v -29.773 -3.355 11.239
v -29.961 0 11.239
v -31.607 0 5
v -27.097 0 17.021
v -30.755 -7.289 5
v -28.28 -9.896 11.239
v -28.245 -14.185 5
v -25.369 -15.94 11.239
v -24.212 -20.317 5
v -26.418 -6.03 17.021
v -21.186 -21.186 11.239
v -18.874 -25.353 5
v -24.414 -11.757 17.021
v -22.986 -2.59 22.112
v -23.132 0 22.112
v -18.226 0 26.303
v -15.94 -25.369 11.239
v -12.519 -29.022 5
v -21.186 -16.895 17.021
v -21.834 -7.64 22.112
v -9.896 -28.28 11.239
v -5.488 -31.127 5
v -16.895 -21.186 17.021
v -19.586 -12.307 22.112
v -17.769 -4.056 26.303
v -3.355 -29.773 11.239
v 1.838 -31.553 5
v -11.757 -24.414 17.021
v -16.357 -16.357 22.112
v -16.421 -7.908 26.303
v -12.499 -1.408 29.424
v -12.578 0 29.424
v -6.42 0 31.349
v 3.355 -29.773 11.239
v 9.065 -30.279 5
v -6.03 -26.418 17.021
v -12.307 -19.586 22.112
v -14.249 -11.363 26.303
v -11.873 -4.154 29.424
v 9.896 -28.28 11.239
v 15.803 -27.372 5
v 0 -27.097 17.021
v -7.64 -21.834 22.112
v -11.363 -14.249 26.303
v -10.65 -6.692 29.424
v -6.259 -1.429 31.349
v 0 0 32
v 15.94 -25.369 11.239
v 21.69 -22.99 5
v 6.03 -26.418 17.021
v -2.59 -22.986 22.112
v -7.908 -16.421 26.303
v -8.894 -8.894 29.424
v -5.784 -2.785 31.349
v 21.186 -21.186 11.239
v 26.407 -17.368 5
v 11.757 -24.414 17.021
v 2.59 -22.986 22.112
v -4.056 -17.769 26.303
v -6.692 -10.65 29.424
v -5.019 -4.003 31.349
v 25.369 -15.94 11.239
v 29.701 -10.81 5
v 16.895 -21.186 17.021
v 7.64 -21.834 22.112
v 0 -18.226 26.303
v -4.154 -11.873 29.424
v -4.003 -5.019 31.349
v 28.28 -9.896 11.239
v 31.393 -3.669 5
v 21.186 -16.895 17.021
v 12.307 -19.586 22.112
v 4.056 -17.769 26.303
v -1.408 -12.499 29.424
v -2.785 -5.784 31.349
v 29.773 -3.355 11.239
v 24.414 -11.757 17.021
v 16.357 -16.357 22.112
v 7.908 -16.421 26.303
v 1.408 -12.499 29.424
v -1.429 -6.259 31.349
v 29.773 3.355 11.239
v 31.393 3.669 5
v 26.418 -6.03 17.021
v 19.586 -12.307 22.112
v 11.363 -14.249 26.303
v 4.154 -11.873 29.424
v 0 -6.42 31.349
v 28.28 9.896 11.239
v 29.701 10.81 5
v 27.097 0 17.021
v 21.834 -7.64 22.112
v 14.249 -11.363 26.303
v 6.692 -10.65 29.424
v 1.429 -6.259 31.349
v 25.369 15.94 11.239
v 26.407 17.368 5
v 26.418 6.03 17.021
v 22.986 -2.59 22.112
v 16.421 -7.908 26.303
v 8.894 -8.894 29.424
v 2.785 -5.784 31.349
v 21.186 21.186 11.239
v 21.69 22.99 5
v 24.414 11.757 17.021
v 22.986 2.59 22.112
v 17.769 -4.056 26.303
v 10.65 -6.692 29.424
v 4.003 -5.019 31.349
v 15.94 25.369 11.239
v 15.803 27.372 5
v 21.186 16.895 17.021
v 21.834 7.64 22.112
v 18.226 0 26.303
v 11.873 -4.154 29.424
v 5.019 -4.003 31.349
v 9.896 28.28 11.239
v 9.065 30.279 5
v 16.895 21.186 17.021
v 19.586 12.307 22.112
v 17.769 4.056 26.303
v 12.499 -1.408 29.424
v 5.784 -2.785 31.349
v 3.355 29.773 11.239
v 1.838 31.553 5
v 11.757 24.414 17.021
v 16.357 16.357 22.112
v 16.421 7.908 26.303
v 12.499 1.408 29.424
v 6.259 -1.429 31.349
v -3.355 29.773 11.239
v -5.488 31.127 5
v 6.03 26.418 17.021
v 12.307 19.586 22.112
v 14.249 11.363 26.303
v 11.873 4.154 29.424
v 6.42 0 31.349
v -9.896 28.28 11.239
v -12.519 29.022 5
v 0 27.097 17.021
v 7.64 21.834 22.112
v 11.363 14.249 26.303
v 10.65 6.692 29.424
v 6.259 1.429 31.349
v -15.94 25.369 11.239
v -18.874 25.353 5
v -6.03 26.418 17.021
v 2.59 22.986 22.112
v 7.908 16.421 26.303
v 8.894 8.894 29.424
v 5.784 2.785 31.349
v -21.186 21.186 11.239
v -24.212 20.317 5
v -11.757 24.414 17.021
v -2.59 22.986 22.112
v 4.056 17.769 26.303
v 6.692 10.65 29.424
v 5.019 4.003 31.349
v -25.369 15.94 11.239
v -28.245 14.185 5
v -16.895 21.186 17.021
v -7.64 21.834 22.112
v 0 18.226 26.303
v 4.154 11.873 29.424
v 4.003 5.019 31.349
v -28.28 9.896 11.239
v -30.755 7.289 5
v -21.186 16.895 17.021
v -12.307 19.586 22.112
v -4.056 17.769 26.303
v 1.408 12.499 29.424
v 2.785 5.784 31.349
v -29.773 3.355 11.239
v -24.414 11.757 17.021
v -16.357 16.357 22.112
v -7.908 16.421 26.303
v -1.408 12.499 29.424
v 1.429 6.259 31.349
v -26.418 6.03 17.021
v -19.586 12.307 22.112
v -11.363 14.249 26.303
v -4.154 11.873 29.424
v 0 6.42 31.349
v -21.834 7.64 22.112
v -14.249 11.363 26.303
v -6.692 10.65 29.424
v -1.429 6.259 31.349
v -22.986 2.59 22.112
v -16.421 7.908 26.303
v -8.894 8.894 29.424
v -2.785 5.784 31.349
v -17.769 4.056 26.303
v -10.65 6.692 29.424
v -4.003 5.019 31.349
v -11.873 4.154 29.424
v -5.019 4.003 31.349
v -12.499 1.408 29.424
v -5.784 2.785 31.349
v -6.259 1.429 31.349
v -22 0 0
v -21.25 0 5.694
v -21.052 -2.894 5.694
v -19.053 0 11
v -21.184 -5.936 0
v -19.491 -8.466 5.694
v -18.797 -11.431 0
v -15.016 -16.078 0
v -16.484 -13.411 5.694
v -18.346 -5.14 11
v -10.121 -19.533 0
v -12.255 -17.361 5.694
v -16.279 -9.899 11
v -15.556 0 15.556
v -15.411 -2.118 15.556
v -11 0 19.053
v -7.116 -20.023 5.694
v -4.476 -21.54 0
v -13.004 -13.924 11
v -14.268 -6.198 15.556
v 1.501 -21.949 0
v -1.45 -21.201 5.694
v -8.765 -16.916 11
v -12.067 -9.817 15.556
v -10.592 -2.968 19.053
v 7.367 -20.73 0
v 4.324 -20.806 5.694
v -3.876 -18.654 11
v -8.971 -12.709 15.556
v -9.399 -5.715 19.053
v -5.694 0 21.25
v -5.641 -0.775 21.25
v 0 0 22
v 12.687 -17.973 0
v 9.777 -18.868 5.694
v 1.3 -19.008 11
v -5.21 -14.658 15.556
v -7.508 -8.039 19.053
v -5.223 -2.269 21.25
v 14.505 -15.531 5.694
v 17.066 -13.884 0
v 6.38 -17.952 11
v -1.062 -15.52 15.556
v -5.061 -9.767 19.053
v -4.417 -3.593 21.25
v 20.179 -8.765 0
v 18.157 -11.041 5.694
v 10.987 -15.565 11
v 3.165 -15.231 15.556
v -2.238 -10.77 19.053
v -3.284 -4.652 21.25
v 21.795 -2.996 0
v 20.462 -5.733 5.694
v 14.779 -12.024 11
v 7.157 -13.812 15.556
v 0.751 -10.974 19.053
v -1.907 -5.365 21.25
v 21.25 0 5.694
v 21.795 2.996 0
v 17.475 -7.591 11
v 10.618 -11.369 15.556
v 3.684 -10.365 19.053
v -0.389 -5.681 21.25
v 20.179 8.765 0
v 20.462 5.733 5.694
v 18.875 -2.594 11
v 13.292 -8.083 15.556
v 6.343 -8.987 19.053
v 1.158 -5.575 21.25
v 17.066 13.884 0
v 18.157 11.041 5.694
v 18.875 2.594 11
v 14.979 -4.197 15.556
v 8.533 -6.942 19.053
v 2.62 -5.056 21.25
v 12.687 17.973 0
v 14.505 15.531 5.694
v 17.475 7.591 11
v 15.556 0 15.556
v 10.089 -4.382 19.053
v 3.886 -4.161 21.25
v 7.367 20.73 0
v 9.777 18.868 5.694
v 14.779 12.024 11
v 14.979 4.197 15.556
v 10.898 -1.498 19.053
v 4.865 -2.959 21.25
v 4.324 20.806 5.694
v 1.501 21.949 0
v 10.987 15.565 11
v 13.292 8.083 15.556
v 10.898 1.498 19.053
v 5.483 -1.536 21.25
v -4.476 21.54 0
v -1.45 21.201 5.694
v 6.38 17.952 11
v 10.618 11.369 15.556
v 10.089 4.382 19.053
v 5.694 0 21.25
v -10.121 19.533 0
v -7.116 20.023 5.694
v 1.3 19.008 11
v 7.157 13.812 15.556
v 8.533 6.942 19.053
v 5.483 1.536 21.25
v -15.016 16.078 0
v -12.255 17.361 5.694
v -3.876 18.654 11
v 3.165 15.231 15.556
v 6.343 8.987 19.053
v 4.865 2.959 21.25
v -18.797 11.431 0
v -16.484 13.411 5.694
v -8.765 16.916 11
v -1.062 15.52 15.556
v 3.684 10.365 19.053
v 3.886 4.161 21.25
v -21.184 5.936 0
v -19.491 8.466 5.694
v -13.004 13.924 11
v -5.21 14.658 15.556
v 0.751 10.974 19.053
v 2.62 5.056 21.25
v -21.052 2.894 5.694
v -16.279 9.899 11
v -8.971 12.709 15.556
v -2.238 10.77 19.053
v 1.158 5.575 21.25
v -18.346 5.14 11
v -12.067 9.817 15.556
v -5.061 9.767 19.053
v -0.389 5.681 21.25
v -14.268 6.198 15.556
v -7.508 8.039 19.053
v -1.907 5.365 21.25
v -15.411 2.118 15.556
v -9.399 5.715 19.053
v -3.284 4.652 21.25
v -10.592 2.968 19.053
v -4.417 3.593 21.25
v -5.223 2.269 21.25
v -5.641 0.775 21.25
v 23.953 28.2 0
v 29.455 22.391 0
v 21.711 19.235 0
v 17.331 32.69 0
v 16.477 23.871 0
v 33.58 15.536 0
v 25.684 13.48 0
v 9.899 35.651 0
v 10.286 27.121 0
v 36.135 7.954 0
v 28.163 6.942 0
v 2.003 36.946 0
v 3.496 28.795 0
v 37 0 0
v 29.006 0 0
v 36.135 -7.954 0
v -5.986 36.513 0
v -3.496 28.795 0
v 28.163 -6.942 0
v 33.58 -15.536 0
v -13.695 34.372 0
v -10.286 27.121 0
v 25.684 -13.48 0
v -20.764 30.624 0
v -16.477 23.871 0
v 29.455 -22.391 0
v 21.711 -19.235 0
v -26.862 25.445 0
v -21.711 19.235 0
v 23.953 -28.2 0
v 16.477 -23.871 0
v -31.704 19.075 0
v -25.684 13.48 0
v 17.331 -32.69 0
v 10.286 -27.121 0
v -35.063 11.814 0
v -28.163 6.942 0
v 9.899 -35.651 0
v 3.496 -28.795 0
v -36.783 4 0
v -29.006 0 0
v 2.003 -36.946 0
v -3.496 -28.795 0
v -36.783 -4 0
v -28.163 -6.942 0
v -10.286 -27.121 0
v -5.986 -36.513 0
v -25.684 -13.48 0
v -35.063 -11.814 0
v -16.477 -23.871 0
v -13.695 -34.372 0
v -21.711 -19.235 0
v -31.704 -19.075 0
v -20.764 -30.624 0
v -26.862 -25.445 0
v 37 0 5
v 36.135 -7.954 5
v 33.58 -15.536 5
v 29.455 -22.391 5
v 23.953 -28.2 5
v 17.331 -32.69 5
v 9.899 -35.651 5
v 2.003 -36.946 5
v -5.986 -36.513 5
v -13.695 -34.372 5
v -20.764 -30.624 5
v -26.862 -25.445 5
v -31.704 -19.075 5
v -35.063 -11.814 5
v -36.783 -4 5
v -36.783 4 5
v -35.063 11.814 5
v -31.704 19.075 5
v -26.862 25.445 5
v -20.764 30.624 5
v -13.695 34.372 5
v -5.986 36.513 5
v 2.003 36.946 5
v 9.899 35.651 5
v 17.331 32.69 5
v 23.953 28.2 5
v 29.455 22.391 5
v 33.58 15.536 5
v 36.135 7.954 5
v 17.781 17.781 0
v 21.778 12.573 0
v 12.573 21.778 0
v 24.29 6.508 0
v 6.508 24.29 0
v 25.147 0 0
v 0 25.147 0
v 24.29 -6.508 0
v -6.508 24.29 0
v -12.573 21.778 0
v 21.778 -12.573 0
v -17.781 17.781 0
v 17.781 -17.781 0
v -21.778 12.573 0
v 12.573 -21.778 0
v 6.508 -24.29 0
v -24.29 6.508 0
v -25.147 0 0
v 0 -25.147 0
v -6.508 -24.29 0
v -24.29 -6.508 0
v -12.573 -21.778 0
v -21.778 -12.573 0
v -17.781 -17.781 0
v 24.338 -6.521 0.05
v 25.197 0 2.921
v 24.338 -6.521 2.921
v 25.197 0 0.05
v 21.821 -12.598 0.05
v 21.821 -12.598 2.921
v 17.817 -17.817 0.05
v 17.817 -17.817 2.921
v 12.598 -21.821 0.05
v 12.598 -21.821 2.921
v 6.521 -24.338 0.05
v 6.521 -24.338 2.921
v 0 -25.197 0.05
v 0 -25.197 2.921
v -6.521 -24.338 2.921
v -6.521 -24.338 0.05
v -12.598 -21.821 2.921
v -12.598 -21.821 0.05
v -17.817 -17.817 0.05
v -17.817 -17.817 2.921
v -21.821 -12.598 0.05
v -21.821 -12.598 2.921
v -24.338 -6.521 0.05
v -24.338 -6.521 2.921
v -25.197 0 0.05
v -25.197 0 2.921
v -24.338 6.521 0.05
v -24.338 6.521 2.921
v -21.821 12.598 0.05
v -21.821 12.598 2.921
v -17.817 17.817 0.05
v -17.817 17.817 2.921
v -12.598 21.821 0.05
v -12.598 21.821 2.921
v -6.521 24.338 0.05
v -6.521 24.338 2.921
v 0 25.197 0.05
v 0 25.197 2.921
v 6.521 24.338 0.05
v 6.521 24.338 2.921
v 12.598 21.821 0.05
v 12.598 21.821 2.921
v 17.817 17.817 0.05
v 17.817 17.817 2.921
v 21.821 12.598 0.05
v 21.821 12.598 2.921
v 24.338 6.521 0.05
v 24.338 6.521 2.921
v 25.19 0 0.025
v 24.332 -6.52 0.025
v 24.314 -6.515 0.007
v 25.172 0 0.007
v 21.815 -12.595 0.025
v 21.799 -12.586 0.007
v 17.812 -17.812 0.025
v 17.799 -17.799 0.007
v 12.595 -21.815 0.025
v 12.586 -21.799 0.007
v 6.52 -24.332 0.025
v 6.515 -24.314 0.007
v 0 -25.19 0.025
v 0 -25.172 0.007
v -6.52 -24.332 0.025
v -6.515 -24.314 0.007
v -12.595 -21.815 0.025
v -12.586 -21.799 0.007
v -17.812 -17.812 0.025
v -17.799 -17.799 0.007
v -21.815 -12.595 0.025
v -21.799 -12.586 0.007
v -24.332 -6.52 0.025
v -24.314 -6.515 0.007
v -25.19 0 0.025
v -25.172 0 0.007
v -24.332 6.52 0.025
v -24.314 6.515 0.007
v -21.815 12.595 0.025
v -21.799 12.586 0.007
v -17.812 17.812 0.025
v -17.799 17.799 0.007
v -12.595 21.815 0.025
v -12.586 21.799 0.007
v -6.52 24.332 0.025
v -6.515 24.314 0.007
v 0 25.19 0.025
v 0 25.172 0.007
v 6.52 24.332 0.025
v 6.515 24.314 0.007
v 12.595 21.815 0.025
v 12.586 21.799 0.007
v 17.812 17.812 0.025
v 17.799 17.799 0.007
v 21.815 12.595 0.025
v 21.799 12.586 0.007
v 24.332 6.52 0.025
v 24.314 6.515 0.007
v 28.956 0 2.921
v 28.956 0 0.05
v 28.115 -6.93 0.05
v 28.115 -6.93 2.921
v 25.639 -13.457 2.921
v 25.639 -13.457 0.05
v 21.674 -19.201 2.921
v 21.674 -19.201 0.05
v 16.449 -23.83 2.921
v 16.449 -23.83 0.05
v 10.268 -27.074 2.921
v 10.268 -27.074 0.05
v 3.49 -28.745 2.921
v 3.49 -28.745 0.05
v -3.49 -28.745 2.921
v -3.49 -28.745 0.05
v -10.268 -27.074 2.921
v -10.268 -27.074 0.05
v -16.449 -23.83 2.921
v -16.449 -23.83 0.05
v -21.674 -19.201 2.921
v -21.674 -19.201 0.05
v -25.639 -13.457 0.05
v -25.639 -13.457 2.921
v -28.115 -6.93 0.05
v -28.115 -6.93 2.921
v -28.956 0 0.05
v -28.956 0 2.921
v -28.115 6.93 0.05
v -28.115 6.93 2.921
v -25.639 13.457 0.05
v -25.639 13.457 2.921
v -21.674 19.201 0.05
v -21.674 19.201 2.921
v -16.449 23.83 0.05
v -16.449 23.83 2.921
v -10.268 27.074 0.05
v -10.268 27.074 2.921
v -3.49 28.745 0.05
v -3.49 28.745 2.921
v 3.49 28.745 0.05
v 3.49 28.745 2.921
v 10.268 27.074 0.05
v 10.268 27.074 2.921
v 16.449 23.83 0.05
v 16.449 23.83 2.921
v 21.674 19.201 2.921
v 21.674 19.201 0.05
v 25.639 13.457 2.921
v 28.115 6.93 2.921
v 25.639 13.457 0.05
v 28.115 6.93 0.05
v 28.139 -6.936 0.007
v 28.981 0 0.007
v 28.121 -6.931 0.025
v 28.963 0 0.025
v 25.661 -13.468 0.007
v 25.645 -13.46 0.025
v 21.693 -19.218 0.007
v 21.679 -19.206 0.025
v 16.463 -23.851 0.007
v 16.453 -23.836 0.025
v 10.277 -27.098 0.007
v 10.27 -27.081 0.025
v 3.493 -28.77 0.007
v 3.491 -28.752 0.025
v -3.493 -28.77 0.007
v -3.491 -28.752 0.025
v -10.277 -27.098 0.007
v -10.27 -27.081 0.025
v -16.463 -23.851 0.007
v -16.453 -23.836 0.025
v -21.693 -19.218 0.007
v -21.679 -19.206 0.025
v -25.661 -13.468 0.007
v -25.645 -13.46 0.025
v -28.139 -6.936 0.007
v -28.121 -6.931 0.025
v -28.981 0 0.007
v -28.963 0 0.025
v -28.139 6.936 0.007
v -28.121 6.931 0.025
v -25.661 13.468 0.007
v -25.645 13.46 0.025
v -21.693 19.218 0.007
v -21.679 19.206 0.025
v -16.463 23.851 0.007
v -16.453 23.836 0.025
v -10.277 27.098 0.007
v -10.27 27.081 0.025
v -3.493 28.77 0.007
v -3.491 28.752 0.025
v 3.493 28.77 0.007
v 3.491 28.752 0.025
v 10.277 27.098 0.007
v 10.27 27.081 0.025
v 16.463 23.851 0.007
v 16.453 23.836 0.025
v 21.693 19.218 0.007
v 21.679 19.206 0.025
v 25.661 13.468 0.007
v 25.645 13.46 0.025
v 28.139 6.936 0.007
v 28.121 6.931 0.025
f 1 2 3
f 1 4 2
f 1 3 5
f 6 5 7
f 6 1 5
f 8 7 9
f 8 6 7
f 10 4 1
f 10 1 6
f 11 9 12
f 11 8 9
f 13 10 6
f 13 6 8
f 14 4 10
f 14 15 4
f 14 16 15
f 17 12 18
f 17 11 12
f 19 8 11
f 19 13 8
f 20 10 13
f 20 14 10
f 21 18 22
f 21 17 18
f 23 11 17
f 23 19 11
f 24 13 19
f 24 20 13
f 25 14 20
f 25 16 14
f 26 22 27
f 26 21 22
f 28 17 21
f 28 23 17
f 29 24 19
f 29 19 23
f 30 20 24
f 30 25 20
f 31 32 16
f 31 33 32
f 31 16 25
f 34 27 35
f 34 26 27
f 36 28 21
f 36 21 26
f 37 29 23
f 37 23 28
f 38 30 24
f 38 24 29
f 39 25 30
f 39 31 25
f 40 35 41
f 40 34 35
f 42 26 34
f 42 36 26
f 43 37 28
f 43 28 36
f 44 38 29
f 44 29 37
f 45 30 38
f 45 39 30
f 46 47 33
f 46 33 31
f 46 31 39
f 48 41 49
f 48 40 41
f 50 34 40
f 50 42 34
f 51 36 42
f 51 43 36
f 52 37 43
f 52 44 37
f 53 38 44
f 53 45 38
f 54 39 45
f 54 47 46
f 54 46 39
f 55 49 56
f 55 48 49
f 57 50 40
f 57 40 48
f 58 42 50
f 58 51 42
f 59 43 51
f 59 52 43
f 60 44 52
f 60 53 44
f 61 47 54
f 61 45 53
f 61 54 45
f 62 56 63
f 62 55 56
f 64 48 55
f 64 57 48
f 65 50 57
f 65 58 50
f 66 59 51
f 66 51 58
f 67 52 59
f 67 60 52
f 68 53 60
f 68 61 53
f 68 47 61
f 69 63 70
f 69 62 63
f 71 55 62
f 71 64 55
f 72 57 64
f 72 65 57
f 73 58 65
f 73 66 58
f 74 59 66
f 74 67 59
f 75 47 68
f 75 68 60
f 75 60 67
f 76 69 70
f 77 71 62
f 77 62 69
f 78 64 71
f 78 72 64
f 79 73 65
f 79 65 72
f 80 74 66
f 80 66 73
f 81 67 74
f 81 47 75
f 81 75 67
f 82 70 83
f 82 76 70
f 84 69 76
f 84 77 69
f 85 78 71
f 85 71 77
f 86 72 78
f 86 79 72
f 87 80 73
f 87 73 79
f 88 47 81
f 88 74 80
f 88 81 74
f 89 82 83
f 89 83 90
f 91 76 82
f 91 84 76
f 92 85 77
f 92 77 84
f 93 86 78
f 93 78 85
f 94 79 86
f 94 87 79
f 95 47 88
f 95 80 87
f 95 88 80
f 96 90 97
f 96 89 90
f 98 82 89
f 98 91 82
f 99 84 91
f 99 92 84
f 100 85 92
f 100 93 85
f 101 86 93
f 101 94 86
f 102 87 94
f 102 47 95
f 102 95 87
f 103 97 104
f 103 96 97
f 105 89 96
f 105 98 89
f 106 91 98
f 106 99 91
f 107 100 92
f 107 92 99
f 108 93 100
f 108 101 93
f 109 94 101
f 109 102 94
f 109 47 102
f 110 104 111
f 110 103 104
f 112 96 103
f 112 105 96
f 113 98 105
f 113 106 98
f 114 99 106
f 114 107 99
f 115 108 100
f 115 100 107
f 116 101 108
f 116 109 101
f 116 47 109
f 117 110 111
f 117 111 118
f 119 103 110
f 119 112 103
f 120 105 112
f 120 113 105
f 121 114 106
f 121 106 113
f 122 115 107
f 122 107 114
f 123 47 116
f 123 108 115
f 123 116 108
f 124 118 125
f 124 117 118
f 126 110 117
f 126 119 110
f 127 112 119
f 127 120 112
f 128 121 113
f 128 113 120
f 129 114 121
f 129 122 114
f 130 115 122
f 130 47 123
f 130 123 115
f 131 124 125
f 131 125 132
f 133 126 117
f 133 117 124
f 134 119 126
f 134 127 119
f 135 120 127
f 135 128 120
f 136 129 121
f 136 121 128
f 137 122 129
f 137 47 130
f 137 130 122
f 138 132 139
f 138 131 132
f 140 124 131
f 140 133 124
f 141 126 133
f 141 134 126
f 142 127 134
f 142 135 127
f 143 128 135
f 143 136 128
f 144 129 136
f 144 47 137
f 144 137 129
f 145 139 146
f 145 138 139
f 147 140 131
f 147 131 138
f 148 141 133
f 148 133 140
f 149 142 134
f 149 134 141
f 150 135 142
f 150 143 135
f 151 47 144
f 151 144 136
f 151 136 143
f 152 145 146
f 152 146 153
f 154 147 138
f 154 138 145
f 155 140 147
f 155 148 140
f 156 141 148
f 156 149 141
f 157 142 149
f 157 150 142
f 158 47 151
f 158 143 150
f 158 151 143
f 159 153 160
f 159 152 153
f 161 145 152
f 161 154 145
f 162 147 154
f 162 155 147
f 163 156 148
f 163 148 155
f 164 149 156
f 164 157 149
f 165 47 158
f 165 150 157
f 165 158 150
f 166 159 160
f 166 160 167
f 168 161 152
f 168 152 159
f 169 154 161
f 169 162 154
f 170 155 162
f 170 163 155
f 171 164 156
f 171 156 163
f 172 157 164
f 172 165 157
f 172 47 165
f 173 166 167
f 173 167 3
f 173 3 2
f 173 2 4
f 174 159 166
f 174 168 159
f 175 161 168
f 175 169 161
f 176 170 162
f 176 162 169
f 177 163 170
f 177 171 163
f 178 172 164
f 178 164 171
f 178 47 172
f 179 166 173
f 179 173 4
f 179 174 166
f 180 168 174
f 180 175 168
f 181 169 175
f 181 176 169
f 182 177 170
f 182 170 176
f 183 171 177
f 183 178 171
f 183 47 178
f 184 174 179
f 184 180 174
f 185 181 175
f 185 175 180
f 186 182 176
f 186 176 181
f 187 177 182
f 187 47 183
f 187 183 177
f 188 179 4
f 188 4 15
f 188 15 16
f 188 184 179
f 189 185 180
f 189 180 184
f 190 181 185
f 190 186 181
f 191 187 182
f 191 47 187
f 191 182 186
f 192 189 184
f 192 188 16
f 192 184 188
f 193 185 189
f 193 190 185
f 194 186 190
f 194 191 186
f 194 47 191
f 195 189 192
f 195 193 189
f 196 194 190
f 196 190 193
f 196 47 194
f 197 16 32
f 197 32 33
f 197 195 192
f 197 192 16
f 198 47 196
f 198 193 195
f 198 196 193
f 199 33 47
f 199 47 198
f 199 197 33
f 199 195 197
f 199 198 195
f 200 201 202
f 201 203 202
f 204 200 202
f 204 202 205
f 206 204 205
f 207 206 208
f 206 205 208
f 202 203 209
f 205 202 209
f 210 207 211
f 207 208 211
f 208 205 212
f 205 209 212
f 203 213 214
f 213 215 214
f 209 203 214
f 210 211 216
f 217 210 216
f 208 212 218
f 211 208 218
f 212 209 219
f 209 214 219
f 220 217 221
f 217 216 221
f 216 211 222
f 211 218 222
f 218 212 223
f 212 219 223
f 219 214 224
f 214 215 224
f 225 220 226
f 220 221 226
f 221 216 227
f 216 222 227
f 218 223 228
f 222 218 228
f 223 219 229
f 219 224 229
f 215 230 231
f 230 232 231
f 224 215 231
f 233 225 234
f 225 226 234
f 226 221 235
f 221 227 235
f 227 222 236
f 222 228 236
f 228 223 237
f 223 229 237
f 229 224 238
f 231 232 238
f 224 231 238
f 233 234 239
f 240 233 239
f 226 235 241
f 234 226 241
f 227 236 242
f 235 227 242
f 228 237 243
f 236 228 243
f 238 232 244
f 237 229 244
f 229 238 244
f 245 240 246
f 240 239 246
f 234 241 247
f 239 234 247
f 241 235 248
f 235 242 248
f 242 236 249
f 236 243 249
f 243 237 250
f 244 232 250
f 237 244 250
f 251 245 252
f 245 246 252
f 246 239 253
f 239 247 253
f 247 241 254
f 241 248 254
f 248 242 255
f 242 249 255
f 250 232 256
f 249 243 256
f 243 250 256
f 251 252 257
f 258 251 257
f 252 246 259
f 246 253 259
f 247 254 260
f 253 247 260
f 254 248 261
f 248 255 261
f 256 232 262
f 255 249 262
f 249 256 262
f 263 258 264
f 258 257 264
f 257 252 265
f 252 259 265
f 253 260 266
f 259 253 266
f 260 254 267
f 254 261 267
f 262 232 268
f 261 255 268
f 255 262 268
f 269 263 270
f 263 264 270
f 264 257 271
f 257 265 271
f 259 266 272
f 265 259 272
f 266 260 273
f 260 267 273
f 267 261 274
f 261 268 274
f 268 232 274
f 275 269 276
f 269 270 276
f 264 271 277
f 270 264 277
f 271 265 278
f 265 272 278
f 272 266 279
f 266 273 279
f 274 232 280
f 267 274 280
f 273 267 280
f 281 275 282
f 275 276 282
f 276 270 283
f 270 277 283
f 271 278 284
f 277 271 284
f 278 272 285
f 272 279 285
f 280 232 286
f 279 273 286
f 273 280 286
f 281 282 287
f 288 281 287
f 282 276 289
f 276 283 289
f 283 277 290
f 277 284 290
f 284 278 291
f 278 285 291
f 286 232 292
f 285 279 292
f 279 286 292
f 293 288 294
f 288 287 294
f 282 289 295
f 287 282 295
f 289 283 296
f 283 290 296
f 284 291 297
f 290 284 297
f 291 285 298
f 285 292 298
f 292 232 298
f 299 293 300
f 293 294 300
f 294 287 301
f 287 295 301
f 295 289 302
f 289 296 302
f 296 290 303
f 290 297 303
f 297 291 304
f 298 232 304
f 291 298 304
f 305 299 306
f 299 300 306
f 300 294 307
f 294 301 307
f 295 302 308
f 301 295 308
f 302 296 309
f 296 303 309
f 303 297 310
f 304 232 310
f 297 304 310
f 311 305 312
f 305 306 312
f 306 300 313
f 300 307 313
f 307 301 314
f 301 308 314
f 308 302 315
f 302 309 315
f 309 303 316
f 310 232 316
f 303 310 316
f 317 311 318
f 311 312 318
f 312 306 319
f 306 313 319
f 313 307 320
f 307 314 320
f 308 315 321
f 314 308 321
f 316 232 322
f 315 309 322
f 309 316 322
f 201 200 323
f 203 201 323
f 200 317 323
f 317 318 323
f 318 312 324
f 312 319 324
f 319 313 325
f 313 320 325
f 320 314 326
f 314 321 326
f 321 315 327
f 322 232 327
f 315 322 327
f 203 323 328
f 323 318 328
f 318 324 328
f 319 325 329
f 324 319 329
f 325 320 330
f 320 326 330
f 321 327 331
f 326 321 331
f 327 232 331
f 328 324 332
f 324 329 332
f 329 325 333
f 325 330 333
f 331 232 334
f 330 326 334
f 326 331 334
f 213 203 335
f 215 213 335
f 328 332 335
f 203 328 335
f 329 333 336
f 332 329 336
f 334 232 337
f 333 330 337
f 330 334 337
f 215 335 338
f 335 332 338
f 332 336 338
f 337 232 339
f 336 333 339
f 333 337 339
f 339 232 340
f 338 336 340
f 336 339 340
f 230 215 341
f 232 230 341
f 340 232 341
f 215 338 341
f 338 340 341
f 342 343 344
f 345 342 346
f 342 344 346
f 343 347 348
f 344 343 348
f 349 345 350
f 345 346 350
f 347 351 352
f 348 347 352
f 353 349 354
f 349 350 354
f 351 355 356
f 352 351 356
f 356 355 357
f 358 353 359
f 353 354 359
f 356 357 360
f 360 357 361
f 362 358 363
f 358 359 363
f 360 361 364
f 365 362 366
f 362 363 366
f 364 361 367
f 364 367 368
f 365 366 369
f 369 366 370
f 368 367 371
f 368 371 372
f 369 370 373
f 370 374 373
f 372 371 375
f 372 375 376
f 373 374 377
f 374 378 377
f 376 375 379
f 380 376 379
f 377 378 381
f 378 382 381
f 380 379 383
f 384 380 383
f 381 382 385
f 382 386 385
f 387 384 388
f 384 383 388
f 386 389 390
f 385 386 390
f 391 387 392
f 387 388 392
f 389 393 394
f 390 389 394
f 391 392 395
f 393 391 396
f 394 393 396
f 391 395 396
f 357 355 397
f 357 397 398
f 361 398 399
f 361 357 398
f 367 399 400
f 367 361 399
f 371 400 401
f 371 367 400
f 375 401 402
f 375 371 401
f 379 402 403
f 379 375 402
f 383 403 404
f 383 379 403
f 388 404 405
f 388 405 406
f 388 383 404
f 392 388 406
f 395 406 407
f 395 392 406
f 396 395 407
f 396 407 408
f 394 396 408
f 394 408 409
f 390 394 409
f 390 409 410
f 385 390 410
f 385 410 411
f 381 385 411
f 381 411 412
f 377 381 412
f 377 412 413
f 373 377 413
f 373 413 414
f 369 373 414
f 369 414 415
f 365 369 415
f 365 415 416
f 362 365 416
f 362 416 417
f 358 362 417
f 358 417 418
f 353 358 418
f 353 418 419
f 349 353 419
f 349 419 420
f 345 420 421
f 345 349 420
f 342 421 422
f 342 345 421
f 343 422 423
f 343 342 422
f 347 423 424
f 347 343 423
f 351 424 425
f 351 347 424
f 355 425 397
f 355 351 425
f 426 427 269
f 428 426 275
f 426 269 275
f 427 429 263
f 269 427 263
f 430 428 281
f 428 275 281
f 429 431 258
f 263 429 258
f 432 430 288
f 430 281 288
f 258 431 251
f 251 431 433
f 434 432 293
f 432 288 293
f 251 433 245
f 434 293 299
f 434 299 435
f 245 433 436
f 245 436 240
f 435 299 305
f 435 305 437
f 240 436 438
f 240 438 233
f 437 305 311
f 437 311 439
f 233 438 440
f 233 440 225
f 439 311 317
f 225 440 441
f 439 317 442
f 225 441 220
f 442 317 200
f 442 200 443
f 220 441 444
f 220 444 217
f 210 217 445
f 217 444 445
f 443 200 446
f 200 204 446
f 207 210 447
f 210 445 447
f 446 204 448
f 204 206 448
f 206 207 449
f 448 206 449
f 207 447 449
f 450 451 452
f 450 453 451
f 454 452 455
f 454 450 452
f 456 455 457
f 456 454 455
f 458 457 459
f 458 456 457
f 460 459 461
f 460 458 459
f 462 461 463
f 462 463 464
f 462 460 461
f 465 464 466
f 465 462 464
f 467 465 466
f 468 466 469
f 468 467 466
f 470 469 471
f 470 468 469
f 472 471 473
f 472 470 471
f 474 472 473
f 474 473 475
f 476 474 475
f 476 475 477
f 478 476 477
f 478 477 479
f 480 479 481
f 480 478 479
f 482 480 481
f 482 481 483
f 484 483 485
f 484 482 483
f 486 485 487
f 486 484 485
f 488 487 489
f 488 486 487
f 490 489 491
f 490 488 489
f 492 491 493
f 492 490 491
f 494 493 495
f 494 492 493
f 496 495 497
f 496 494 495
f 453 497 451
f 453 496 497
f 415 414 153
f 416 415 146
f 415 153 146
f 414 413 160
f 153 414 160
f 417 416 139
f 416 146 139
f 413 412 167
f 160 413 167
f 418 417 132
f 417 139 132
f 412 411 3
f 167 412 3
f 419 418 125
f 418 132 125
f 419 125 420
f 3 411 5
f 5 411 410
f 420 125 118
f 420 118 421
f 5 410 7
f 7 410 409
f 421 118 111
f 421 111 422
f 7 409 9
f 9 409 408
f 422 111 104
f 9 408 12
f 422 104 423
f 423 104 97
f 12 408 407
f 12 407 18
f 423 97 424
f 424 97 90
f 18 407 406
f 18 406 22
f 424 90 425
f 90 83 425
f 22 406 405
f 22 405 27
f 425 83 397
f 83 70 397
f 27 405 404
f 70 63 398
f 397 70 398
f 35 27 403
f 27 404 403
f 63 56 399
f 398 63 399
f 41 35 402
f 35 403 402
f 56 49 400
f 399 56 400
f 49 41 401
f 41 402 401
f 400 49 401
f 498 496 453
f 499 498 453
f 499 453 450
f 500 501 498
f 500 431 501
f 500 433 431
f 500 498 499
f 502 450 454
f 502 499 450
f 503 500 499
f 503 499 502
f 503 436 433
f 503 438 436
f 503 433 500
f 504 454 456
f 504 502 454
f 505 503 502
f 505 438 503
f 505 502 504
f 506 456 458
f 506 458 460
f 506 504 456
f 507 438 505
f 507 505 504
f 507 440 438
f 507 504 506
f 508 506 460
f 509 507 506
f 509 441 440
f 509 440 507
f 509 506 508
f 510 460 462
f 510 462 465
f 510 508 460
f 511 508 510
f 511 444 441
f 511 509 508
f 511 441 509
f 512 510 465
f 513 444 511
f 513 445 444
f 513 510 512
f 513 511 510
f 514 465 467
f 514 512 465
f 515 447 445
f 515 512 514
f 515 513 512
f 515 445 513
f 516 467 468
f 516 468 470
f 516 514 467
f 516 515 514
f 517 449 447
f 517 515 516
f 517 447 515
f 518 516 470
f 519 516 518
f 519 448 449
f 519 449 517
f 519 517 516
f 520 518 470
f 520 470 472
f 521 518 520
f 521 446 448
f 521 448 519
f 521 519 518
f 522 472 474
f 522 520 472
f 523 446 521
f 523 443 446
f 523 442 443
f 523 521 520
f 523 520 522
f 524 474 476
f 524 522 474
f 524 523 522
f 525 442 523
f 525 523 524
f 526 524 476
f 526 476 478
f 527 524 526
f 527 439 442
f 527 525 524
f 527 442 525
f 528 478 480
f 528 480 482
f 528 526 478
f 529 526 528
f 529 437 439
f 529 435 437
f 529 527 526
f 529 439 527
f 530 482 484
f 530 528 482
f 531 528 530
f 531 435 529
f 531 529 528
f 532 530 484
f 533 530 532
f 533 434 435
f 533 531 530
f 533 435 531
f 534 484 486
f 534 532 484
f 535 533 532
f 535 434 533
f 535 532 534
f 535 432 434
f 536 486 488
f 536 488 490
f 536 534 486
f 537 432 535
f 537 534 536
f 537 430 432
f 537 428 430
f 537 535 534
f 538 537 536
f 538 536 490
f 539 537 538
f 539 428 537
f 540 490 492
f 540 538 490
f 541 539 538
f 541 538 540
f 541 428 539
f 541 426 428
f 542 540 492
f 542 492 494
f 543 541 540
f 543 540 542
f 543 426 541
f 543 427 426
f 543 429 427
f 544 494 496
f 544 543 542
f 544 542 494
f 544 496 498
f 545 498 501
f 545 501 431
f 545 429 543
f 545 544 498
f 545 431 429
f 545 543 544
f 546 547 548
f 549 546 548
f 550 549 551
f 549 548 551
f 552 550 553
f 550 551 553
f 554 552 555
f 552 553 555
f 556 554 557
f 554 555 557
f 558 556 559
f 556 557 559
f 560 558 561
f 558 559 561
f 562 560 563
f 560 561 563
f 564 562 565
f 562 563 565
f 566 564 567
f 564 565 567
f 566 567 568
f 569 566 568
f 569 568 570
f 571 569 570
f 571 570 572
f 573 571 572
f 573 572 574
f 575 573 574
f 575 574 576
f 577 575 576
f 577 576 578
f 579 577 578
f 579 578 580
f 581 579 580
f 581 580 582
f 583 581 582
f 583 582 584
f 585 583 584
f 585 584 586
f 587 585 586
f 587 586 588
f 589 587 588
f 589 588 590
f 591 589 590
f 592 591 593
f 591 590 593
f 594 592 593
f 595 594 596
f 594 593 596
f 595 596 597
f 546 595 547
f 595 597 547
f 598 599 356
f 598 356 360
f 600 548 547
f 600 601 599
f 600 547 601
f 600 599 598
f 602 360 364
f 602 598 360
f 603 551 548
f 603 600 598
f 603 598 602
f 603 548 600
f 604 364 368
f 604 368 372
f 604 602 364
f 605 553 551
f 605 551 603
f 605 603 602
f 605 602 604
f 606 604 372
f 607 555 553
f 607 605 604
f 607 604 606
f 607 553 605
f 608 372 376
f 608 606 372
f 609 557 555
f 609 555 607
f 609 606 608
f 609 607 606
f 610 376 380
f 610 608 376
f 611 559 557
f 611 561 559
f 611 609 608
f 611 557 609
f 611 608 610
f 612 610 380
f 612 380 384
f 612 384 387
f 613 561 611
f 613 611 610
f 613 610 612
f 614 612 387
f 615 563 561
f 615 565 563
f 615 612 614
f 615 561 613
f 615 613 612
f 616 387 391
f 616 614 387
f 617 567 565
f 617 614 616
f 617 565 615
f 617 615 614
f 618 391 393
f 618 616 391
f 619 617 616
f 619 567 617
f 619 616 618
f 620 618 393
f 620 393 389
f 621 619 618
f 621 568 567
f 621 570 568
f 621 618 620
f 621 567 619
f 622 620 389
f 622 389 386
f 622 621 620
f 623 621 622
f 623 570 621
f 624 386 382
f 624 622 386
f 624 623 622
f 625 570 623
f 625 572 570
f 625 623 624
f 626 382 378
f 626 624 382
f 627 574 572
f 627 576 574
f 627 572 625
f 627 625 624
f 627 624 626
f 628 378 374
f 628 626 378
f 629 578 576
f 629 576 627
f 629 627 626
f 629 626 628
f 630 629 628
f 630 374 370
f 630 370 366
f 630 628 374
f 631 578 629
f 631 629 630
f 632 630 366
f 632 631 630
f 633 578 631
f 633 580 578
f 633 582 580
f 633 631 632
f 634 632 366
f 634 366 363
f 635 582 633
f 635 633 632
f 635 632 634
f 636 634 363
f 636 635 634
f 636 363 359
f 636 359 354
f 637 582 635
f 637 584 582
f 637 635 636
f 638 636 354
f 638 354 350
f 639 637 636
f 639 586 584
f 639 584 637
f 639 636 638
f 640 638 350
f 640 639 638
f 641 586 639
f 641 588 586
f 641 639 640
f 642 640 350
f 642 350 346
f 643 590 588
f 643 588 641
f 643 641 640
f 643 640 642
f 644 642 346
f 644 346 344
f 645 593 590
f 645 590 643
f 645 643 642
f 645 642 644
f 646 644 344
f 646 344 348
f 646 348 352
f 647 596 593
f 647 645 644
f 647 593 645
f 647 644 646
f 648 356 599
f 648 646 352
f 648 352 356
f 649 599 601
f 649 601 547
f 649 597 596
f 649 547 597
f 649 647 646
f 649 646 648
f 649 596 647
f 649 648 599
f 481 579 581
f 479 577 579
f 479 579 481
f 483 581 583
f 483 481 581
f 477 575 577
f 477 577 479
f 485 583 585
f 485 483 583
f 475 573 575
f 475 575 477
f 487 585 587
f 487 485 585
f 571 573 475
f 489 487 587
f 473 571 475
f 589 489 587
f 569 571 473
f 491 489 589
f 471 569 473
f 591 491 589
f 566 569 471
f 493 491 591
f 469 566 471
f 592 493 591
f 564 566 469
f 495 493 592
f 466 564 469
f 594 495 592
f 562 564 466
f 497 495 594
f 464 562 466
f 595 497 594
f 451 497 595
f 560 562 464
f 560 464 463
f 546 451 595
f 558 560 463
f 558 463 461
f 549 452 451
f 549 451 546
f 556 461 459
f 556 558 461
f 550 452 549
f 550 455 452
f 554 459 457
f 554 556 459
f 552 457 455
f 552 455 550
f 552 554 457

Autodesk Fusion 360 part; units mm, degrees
sketch "Sketch1" plane through (0, 0, 0) normal (0, 1, 0) x (1, 0, 0)
  line L0 (-36, 0) -> (40, 0) construction
  arc A0 (-32, 0) -> (0, -32) centre (0, 0) ccw
  arc A1 (-22, 0) -> (0, -22) centre (0, 0) ccw
  line L1 (0, -32) -> (0, -22)
  line L2 (-22, 0) -> (-32, 0)
  dimension "d3" = 22
  dimension "d4" = 32
revolve "Revolve1" add sketch "Sketch1" angle 360 about axis through (0, 0, 1.75) along (0, 0, 1)
sketch "Sketch2" plane through (0, 0, 0) normal (0, 0, -1) x (1, 0, 0)
  circle A0 centre (0, 0) radius 32
  circle A1 centre (0, 0) radius 22
  circle A2 centre (0, 0) radius 25.1968
  circle A3 centre (0, 0) radius 28.956
  dimension "d6" = 50.3936
  dimension "d7" = 57.912
extrude "Extrude1" cut sketch "Sketch2" against normal blind 2.921 contours A3
sketch "Sketch3" plane through (0, 0, 0) normal (0, 0, -1) x (1, 0, 0)
  circle A0 centre (0, 0) radius 32
  circle A1 centre (0, 0) radius 28.956
  circle A2 centre (0, 0) radius 37
  dimension "d10" = 74
extrude "Extrude2" add sketch "Sketch3" against normal blind 5 contours A0 | A2
fillet "Fillet1" radius 0.05 2 edges at (-23.4917, 9.1116, 0) (-26.9965, -10.4709, 0)
